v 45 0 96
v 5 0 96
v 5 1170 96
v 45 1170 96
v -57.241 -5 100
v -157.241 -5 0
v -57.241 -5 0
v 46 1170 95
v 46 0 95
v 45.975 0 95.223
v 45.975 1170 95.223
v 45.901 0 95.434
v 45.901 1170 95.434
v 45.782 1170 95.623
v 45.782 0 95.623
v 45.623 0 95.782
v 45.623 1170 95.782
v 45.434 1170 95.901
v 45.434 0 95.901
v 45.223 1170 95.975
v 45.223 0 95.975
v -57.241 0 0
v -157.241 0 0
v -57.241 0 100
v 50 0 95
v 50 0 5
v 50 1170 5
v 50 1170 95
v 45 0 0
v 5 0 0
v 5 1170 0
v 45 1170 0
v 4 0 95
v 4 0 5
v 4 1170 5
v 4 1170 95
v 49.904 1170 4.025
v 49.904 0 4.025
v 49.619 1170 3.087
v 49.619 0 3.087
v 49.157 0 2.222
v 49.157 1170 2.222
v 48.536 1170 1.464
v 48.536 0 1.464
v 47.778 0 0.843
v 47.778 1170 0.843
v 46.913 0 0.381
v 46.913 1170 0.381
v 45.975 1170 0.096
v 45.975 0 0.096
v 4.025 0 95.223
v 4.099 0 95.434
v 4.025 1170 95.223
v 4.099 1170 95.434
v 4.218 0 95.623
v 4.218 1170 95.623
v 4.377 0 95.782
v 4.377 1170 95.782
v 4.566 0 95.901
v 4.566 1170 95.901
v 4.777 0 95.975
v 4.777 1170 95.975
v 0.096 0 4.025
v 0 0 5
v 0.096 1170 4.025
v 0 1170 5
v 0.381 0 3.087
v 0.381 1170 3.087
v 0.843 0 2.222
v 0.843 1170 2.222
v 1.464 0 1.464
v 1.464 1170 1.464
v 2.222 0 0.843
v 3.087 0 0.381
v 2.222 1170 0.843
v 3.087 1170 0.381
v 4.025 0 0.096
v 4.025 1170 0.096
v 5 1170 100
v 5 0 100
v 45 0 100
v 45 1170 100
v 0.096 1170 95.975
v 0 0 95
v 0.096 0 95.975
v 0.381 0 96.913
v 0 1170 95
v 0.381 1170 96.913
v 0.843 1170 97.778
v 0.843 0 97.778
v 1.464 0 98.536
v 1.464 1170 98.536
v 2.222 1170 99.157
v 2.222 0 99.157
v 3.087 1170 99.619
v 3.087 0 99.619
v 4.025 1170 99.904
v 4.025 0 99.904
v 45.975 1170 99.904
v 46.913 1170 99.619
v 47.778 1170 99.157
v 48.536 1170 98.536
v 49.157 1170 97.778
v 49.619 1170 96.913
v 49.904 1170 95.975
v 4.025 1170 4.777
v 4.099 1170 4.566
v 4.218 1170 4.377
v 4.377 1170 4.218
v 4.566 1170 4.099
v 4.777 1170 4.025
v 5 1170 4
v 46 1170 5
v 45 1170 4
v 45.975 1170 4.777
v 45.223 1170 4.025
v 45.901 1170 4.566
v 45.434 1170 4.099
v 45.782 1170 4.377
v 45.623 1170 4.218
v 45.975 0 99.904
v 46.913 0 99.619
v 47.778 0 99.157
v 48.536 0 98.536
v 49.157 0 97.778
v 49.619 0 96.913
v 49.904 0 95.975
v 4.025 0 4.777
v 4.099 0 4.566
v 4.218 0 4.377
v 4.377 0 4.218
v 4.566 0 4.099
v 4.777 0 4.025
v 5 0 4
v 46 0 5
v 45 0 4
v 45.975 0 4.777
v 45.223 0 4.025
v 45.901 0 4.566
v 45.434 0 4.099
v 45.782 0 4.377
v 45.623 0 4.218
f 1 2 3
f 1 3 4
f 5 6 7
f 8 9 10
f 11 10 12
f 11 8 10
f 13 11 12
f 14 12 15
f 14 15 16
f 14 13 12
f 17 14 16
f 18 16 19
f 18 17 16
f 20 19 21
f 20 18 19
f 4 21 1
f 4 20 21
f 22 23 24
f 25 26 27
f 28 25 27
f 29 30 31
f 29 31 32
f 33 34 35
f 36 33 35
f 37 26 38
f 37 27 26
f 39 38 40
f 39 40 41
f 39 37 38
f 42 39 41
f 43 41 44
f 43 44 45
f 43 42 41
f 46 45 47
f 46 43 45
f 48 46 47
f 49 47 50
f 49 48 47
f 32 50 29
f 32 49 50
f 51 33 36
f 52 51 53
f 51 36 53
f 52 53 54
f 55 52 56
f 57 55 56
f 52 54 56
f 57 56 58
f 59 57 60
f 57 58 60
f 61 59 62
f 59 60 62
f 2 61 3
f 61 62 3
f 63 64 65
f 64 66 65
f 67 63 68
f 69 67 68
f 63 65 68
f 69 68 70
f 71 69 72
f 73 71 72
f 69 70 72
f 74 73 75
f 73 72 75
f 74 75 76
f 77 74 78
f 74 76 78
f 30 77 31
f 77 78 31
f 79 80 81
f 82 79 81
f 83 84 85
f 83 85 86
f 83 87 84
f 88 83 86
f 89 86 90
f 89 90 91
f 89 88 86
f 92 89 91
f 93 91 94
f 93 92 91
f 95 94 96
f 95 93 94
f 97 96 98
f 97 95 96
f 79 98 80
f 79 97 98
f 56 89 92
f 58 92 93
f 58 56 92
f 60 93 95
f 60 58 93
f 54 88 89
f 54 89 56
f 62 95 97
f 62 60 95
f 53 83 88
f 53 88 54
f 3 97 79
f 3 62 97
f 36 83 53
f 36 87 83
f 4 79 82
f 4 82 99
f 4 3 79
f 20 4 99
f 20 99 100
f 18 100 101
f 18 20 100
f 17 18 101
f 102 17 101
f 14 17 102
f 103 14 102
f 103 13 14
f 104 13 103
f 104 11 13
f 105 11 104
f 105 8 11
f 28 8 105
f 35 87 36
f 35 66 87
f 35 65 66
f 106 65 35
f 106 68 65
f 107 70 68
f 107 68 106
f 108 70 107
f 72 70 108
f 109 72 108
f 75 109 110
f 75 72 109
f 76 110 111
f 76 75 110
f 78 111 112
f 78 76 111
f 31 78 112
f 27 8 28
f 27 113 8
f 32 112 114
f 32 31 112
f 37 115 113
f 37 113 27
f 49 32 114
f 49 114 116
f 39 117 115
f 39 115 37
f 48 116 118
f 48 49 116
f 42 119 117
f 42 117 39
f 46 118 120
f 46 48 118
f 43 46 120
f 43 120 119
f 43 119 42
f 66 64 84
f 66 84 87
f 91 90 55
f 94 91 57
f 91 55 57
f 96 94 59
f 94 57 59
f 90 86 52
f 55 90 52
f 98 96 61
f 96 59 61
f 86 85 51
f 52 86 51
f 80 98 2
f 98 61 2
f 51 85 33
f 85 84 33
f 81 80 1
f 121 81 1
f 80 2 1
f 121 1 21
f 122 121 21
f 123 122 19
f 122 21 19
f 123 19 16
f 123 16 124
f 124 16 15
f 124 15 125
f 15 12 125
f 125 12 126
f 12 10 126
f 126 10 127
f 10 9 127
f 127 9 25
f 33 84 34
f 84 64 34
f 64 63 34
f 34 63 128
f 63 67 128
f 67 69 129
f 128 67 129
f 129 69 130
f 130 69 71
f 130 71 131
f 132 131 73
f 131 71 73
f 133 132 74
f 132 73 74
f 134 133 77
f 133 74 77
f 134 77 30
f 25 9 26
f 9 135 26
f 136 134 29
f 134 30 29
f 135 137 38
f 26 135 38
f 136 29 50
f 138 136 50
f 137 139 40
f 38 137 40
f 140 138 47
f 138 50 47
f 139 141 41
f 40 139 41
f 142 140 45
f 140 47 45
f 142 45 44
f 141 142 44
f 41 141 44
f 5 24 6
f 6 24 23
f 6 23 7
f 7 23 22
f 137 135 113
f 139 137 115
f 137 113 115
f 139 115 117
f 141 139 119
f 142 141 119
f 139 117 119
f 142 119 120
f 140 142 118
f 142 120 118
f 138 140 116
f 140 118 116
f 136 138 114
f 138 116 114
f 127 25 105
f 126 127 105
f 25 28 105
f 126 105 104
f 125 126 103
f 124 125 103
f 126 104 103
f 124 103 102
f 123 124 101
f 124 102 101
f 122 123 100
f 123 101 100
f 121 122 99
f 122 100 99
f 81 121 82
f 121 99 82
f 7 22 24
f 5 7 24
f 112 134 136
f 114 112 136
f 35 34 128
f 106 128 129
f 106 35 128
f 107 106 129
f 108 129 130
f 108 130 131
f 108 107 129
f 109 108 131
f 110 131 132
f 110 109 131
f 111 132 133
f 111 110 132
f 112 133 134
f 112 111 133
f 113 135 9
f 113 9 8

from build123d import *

# Parameters (mm, degrees)
F0_W     = 50
F0_H     = 1170
F1_DEPTH = 100
F2_R     = 5
F3_T     = -4
F5_DEPTH = 5


with BuildPart() as f1:
    # F0 (on Top) → F1 (new body)
    with BuildSketch(Plane.XY):
        with Locations((25, 585)):
            Rectangle(F0_W, F0_H)
    extrude(amount=F1_DEPTH)

    # F2
    f2_edges = [f1.edges().sort_by_distance(p)[0] for p in [
        (50, 585, 100),
        (0, 585, 100),
        (50, 585, 0),
        (0, 585, 0),
    ]]
    fillet(f2_edges, radius=F2_R)

    # F3
    f3_openings = [f1.faces().sort_by_distance(p)[0] for p in [
        (25, 0, 50),
        (25, 1170, 50),
    ]]
    offset(amount=F3_T, openings=f3_openings)


with BuildPart() as f5:
    # F4 (on Front) → F5 (new body)
    with BuildSketch(Plane.XZ):
        Polygon((-157.241035, 0), (-57.241035, 0), (-57.241035, 100), align=None)
    extrude(amount=F5_DEPTH)


solid = Compound([f1.part, f5.part])
